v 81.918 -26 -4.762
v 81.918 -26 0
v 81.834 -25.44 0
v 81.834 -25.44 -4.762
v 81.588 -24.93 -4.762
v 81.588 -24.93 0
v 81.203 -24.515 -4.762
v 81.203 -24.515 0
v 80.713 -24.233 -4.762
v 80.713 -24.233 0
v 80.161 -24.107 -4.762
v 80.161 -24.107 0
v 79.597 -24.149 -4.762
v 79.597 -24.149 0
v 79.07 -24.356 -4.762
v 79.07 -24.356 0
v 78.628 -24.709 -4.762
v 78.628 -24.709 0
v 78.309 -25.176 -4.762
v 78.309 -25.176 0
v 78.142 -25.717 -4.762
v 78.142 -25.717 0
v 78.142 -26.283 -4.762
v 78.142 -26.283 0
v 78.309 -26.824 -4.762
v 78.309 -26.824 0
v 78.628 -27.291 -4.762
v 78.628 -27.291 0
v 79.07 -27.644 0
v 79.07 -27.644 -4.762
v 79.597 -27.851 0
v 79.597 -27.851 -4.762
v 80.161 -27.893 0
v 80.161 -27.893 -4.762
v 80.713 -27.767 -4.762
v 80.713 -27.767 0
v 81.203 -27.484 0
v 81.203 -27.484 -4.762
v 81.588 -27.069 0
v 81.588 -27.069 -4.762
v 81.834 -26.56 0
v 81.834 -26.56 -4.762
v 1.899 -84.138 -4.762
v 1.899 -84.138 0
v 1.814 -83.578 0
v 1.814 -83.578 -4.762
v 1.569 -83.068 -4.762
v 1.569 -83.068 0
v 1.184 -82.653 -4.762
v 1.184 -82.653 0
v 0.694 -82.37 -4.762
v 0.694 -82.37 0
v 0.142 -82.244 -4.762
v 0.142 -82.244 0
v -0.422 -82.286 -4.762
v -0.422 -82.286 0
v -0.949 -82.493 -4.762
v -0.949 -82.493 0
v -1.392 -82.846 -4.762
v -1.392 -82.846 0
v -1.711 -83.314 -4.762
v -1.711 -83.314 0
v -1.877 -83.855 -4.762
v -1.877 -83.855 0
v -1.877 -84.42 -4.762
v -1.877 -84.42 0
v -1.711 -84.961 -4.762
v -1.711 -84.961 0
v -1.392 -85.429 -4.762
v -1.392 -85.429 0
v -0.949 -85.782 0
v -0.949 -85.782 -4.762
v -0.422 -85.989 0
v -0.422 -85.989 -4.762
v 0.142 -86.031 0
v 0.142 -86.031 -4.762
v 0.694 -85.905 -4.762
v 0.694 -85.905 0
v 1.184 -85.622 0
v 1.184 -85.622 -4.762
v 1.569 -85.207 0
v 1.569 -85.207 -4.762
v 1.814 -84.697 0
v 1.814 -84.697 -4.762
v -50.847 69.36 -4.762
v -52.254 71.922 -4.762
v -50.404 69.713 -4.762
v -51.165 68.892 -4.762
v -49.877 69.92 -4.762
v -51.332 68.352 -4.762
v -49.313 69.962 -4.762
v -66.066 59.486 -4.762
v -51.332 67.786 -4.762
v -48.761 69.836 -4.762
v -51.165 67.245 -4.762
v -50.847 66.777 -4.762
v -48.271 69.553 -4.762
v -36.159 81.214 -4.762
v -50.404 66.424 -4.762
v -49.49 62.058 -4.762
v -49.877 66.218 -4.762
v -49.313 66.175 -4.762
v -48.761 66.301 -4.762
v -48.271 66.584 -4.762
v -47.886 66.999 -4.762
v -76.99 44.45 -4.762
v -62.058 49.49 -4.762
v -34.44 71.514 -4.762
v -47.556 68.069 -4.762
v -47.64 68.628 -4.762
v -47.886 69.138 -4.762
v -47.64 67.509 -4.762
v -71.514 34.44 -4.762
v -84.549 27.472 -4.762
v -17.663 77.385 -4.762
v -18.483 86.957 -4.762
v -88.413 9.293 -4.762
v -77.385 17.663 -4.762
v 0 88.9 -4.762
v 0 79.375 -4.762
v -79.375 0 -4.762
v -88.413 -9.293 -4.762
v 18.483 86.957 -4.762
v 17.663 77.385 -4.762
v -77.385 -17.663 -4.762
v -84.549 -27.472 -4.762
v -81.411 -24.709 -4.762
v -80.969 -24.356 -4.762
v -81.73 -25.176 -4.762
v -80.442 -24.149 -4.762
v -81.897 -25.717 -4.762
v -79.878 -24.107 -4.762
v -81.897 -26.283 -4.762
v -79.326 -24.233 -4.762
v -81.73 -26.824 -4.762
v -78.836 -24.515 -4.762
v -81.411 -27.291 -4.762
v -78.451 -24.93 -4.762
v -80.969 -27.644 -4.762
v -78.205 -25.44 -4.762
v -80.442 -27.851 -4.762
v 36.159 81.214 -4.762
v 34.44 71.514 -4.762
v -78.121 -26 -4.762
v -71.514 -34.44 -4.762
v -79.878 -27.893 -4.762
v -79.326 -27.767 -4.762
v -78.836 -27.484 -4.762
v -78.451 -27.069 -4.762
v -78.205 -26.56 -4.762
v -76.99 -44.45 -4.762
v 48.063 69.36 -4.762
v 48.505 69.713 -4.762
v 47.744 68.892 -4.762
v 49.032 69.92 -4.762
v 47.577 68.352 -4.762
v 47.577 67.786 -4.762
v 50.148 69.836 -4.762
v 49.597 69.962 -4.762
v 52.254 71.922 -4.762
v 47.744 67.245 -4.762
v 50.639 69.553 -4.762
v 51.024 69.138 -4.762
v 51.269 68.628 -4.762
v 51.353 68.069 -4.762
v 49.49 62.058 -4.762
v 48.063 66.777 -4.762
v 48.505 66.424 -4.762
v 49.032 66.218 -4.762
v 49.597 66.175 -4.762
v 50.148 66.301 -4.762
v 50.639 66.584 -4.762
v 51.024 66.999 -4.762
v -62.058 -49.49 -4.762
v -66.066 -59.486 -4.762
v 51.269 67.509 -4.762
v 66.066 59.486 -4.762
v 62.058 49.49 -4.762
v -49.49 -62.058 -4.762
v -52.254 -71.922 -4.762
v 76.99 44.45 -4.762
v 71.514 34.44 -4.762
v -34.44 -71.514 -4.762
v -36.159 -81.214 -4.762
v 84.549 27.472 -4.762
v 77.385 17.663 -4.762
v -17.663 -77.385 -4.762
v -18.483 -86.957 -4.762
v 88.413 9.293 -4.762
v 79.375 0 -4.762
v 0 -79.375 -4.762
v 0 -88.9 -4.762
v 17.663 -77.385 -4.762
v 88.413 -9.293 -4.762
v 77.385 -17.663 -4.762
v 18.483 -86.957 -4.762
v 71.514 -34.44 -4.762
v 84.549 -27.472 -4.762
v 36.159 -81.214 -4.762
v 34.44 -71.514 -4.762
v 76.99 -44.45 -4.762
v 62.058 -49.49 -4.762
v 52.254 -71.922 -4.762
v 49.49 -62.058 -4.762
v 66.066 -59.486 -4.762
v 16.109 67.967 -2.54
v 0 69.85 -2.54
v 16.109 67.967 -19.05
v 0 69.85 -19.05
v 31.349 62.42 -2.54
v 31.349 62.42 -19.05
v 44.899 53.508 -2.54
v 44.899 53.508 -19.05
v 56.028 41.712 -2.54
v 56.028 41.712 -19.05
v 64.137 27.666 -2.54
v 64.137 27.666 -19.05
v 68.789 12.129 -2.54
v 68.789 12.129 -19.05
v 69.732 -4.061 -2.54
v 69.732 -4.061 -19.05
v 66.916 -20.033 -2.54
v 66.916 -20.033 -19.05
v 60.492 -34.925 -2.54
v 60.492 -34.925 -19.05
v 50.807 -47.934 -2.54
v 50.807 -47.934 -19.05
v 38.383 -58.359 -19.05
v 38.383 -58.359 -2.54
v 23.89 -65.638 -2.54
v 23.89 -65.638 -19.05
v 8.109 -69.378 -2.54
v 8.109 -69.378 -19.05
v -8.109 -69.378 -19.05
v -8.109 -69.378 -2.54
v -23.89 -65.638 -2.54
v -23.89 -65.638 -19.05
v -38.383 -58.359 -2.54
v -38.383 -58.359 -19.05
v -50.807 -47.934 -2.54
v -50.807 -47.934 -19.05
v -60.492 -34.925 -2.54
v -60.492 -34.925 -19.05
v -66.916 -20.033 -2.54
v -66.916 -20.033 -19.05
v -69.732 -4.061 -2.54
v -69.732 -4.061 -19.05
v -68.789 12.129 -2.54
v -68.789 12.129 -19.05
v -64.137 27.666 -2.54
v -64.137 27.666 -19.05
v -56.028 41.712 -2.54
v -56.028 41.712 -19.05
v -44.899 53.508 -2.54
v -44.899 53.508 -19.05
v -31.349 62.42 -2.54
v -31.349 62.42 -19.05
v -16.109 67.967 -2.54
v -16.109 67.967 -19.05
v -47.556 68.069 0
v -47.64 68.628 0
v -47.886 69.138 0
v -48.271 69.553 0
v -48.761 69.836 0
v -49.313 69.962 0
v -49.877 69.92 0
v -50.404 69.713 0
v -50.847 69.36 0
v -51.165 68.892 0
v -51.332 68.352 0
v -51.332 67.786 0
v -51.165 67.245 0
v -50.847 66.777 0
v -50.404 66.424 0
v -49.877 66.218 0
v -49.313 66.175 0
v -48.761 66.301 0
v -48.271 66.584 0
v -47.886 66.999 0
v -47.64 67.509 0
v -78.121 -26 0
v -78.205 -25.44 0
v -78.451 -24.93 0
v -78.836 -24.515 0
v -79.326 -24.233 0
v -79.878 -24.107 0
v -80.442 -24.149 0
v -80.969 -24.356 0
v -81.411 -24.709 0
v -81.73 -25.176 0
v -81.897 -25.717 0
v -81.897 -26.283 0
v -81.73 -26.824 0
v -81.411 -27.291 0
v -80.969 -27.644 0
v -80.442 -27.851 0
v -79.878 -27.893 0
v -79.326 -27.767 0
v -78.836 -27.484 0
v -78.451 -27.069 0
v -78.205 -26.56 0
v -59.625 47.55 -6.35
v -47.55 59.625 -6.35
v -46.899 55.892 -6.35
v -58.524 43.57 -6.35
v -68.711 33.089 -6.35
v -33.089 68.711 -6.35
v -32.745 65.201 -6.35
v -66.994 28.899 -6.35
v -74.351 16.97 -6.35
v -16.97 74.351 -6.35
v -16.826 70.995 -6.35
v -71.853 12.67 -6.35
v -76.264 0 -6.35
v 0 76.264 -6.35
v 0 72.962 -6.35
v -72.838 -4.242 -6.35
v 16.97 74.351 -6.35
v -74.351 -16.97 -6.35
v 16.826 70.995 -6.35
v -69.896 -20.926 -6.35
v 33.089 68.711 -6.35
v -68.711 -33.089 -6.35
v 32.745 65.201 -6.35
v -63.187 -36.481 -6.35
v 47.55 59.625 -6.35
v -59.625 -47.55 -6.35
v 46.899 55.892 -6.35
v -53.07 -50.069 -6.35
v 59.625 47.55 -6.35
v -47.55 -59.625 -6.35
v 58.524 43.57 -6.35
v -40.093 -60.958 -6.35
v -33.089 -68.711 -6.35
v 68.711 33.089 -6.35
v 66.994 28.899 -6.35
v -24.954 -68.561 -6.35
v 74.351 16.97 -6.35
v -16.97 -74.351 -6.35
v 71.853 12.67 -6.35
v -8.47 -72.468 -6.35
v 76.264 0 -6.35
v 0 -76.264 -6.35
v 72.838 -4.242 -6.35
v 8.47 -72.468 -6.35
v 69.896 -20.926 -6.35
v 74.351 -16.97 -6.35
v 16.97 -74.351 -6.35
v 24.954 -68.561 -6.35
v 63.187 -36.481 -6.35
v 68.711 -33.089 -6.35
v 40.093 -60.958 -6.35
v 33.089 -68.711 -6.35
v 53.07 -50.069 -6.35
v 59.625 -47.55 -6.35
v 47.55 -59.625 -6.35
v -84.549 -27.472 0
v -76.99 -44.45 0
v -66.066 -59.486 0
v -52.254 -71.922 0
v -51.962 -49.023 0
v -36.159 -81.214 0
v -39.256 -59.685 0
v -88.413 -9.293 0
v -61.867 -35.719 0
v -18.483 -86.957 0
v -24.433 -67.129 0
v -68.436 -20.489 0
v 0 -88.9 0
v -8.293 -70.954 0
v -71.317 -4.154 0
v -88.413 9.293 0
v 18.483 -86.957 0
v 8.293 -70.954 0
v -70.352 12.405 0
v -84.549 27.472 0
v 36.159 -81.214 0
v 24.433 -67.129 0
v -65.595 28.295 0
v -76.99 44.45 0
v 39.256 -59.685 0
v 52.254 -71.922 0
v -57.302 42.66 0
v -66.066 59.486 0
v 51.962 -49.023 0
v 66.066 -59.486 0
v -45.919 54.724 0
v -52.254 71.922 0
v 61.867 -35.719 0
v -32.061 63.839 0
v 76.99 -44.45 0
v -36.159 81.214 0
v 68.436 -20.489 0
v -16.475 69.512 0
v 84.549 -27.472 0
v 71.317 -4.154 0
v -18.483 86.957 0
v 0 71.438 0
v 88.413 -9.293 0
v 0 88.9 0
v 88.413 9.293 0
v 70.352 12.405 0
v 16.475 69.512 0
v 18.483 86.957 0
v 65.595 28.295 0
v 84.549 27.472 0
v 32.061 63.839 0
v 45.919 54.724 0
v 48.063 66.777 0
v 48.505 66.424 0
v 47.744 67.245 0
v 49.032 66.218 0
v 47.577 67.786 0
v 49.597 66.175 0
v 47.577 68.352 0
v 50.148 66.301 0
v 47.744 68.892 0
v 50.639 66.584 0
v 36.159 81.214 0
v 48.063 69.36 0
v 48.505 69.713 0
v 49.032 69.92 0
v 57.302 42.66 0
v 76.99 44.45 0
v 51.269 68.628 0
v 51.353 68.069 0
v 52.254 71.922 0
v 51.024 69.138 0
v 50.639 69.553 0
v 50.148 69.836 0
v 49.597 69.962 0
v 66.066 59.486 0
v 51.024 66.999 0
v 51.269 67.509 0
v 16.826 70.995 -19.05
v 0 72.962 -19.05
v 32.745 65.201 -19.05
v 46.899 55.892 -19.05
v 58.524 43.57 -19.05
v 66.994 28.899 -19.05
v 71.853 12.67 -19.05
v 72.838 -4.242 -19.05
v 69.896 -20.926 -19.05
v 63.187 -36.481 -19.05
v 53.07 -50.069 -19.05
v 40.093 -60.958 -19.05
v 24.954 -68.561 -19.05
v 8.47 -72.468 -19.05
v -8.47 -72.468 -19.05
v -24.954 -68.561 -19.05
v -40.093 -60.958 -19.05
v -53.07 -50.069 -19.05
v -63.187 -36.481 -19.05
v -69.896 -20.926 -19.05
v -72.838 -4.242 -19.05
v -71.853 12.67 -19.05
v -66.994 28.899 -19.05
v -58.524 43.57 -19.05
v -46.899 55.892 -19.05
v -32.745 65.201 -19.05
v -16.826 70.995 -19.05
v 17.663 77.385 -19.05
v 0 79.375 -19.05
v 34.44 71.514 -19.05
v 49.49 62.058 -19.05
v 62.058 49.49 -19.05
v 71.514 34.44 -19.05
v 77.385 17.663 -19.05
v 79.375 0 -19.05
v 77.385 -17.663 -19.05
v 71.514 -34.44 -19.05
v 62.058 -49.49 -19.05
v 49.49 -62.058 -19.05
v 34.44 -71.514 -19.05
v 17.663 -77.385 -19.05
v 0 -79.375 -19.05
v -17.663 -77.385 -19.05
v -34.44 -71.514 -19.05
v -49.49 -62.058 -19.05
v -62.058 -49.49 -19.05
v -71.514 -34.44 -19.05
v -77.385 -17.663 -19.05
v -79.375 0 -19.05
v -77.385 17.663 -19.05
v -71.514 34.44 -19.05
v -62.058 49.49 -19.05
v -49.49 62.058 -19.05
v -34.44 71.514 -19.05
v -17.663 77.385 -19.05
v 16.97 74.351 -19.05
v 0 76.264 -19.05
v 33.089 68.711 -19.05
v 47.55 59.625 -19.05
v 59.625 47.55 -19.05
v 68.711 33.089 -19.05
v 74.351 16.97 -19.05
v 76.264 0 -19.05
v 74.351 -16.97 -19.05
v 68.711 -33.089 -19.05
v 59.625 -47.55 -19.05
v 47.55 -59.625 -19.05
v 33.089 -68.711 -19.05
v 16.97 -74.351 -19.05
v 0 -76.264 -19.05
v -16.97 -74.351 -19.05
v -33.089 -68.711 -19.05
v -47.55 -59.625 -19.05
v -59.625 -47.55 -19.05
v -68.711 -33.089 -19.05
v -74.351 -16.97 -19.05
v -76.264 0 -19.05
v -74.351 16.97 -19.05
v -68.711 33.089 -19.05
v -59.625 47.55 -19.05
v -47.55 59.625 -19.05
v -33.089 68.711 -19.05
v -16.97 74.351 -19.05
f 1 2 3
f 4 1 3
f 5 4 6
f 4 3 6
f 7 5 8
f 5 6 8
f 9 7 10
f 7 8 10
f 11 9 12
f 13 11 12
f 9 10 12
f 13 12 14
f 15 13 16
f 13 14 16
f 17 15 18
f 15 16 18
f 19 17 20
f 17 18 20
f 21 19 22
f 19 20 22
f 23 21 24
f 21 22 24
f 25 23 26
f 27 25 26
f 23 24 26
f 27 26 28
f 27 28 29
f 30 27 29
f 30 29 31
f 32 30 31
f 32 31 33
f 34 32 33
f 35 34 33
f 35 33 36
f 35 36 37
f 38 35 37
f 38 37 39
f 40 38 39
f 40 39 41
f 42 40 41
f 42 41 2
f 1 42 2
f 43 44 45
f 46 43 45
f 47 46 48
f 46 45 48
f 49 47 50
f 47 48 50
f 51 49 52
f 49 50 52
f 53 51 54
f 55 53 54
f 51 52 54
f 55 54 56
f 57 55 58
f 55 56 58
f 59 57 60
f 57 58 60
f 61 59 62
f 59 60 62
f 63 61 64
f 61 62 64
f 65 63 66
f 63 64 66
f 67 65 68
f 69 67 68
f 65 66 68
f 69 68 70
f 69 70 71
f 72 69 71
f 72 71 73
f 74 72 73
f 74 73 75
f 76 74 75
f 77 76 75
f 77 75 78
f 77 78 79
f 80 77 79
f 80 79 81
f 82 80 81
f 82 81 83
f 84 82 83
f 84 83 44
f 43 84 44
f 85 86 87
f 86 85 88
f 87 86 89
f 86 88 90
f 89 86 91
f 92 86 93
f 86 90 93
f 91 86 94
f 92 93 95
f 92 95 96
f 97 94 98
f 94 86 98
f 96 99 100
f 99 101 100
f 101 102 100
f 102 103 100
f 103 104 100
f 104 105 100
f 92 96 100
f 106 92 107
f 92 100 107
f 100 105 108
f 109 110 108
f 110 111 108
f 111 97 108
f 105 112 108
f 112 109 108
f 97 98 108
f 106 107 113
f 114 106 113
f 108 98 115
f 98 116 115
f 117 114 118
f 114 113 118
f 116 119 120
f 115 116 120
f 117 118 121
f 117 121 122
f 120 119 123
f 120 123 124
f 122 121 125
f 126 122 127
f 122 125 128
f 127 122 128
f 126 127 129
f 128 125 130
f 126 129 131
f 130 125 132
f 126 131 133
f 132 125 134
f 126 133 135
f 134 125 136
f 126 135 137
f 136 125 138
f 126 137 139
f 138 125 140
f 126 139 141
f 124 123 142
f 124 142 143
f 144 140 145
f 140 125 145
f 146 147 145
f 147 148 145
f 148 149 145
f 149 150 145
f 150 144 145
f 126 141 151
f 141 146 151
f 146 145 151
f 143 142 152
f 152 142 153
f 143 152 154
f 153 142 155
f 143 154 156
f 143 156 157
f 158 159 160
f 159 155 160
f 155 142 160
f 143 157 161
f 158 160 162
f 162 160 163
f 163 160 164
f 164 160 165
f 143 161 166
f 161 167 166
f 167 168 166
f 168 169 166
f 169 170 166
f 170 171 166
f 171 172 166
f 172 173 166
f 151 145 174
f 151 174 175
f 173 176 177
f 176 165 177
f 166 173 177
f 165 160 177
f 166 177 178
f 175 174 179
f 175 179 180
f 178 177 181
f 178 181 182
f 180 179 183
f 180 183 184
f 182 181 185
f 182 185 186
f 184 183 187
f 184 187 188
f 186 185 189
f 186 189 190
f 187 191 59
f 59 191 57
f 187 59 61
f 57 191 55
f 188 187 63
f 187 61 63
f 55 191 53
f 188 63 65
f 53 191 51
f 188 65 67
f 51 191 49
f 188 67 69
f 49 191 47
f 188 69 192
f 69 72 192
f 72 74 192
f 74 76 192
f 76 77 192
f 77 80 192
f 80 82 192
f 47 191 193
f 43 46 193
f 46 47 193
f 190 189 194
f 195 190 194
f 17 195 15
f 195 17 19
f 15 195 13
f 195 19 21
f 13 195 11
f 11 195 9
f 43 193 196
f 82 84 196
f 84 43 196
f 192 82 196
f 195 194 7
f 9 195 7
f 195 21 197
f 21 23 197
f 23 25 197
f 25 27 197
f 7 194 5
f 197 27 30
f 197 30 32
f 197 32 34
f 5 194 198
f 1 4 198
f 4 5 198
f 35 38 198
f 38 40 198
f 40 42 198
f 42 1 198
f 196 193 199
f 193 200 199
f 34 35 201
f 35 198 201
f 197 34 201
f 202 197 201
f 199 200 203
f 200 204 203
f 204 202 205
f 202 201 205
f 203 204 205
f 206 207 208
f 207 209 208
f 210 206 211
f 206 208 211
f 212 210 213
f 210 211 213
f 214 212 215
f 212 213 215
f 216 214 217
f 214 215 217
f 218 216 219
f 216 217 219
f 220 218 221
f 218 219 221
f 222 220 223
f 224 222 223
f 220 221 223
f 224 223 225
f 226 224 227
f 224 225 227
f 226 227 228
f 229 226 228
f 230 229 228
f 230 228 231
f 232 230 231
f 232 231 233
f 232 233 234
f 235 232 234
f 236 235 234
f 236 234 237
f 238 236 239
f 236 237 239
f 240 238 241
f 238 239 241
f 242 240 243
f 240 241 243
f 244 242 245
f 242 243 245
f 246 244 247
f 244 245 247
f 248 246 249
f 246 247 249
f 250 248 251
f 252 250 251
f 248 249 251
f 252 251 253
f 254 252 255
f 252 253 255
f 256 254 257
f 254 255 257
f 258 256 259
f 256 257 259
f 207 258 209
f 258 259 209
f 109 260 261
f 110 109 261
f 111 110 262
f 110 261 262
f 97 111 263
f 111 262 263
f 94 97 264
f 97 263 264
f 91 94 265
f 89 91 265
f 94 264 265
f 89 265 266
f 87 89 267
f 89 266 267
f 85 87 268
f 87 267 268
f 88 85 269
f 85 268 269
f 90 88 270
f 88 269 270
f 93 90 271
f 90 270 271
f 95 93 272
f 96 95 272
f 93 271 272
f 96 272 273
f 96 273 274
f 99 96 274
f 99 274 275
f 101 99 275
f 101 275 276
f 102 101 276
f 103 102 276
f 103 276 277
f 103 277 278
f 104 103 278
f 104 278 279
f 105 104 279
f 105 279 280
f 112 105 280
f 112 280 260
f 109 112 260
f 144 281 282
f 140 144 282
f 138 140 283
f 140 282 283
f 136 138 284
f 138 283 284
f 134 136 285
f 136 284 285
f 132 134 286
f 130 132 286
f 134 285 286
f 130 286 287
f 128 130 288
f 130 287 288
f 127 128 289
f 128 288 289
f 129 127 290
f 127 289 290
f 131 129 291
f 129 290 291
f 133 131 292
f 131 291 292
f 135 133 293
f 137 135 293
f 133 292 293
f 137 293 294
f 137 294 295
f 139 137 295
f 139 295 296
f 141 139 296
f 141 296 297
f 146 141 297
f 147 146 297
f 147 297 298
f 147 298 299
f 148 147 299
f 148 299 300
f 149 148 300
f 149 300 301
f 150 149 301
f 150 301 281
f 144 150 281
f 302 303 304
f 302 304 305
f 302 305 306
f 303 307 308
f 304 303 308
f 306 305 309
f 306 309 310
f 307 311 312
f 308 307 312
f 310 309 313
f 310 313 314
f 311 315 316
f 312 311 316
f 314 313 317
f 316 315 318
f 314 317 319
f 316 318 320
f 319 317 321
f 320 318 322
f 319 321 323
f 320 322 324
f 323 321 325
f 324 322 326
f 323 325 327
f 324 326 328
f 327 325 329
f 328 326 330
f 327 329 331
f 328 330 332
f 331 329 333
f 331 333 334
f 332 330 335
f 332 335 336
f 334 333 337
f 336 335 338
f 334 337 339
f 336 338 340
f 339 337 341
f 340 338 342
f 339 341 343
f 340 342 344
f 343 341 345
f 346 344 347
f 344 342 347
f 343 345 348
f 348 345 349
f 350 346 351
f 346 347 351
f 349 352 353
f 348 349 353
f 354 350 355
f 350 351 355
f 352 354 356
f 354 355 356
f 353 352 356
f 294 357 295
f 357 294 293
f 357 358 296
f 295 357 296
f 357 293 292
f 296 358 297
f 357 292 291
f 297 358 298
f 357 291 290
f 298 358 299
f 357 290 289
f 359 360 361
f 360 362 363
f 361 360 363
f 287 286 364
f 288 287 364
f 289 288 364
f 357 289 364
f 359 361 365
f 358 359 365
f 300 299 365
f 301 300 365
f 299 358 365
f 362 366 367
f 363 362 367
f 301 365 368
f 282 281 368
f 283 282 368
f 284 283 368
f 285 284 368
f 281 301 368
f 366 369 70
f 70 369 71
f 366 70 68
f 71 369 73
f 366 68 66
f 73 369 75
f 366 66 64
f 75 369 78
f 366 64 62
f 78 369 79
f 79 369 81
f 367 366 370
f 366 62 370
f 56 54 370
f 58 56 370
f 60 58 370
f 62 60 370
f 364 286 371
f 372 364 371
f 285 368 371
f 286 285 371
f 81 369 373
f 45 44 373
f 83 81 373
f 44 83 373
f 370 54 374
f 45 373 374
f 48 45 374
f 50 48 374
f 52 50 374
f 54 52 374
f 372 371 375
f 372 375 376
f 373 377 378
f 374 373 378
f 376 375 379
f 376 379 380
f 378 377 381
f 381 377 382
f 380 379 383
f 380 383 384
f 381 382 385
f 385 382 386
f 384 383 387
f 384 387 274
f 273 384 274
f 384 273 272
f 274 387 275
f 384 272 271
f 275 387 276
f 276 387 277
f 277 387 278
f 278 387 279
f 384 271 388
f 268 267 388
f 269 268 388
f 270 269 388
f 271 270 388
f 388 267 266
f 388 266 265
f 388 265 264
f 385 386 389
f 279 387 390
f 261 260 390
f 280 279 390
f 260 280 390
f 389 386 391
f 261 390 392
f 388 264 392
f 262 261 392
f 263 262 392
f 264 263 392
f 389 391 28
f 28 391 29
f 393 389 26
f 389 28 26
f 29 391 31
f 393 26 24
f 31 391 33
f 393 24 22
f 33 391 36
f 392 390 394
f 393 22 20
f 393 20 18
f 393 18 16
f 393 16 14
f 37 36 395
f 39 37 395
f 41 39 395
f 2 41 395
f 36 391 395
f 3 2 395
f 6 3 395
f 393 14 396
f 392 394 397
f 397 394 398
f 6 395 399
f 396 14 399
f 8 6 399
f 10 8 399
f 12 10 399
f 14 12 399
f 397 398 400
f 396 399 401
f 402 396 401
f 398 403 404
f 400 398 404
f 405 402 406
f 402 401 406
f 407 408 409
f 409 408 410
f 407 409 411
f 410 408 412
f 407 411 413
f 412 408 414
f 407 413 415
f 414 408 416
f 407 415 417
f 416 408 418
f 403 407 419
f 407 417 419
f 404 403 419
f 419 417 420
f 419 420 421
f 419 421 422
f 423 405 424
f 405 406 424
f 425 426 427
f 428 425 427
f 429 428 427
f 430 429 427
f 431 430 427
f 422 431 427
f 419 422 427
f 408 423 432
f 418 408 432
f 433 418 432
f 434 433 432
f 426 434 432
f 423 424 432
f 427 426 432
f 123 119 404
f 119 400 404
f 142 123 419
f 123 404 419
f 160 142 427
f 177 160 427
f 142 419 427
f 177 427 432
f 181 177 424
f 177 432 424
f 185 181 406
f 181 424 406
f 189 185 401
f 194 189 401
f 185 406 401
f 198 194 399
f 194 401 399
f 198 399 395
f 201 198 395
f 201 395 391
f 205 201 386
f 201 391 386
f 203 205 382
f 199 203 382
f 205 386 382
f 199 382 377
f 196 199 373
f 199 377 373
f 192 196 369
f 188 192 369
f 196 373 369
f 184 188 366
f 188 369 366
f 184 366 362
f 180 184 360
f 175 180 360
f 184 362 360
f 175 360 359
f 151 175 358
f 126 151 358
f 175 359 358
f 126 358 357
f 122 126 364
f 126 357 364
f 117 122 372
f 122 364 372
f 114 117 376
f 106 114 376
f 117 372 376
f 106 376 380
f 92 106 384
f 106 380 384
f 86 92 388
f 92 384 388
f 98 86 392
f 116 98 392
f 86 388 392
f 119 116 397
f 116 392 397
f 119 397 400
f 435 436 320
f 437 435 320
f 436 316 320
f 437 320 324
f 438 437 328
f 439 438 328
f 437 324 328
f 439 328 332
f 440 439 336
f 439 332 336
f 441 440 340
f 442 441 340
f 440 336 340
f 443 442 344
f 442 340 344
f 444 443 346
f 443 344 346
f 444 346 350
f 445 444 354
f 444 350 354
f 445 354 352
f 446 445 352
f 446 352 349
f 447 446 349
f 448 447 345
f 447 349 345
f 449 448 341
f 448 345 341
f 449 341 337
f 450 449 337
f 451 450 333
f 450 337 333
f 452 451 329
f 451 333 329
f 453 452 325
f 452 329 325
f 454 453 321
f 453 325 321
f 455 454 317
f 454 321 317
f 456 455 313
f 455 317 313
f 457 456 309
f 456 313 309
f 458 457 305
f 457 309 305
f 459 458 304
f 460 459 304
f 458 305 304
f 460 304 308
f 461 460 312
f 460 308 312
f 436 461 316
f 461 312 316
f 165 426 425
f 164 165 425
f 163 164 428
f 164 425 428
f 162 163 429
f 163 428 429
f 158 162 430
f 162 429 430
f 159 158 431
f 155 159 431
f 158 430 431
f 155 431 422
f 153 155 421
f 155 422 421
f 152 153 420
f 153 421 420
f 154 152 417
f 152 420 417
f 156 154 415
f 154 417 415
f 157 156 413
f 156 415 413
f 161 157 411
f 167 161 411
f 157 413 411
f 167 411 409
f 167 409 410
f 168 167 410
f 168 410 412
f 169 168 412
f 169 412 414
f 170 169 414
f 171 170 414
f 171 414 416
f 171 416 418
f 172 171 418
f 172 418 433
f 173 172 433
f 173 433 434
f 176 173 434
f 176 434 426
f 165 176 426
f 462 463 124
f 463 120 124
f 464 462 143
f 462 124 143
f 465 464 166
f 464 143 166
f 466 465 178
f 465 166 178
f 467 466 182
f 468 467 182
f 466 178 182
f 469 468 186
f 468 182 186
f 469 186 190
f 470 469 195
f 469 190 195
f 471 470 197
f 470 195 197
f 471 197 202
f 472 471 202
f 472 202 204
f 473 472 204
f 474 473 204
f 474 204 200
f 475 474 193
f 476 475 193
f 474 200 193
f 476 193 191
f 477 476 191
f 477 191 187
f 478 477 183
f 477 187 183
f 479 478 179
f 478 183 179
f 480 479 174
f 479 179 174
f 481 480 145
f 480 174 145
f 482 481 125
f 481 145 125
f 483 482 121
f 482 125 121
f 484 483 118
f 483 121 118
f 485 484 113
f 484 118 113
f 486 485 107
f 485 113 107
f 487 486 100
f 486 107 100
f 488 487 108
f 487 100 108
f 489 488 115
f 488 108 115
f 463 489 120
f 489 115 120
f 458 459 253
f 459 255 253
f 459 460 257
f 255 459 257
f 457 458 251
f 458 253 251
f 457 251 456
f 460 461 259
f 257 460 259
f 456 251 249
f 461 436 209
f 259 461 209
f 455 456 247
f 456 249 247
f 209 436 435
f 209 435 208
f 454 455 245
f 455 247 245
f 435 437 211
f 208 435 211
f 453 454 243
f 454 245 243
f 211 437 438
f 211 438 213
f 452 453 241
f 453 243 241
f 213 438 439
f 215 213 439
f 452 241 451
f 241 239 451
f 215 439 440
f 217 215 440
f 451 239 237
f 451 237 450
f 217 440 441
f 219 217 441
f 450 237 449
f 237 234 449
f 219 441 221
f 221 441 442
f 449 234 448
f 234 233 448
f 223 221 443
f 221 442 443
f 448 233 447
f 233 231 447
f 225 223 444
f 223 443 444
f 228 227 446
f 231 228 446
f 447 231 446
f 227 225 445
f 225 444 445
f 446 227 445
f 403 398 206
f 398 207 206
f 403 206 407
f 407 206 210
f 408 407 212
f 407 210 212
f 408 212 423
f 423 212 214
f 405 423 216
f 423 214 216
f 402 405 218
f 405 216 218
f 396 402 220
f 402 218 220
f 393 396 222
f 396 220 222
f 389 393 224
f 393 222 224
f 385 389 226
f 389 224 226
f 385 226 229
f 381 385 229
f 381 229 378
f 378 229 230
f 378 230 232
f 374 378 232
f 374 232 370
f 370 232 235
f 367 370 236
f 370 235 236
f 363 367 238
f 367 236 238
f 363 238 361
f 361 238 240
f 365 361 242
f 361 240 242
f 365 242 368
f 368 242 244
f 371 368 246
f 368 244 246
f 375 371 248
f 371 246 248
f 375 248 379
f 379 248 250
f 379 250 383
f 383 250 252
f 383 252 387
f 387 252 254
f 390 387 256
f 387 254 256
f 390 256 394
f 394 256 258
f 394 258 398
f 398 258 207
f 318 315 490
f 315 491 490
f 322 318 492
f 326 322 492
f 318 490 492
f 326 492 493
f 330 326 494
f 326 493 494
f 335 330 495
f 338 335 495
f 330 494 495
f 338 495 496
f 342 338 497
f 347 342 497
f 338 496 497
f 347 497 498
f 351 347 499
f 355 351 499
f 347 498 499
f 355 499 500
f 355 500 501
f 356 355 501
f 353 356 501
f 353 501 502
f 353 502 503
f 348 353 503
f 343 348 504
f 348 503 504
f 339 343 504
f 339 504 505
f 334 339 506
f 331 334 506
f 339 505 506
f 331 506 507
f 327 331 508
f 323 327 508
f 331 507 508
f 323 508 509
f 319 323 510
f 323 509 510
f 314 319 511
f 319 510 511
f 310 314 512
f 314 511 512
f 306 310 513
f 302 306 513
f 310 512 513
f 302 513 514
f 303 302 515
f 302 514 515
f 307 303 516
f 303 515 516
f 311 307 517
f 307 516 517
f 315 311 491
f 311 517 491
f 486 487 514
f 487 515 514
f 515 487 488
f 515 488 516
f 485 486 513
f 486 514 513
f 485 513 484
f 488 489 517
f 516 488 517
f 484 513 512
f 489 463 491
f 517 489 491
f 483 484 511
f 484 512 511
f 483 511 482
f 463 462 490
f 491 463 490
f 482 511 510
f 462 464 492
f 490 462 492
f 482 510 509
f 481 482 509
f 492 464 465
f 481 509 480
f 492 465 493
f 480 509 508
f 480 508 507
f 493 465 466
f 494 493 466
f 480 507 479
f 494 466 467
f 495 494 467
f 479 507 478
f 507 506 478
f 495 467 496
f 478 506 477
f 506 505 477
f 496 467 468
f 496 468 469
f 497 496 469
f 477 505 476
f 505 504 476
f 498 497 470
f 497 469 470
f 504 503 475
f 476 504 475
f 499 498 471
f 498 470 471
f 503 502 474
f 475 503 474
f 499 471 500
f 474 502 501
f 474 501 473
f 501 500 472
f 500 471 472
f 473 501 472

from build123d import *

# Parameters (mm, degrees)
F_6_CLEARANCE_HOLE1_D     = 3.7973
F_6_CLEARANCE_HOLE1_DEPTH = 25.4
F_6_CLEARANCE_HOLE1_TIP   = 1.140824014


with BuildPart() as part:
    # Sketch2 → Revolve1 (revolve)
    with BuildSketch(Plane(origin=(0, 0, 0), x_dir=(0, 0, -1), z_dir=(1, 0, 0))):
        Polygon((0, 71.4375), (2.54, 69.85), (19.05, 69.85), (19.05, 72.9615), (6.35, 72.9615), (6.35, 76.2635), (19.05, 76.2635), (19.05, 79.375), (4.7625, 79.375), (4.7625, 88.9), (0, 88.9), align=None)
    revolve(axis=Axis((0, 0, 0), (0, 0, -1)))

    # #6 Clearance Hole1
    with Locations(Plane(origin=(0, 0, -4.7625), x_dir=(-1, 0, 0), z_dir=(0, 0, -1))):
        with Locations((0, -84.1375), (80.01951764, -25.999917364), (49.454781665, 68.068667364), (-80.01951764, -25.999917364), (-49.454781665, 68.068667364)):
            Hole(F_6_CLEARANCE_HOLE1_D / 2, depth=F_6_CLEARANCE_HOLE1_DEPTH)
            with Locations((0, 0, -(F_6_CLEARANCE_HOLE1_DEPTH + F_6_CLEARANCE_HOLE1_TIP / 2))):  # 118° drill point
                Cone(0, F_6_CLEARANCE_HOLE1_D / 2, F_6_CLEARANCE_HOLE1_TIP, mode=Mode.SUBTRACT)


solid = part.part
